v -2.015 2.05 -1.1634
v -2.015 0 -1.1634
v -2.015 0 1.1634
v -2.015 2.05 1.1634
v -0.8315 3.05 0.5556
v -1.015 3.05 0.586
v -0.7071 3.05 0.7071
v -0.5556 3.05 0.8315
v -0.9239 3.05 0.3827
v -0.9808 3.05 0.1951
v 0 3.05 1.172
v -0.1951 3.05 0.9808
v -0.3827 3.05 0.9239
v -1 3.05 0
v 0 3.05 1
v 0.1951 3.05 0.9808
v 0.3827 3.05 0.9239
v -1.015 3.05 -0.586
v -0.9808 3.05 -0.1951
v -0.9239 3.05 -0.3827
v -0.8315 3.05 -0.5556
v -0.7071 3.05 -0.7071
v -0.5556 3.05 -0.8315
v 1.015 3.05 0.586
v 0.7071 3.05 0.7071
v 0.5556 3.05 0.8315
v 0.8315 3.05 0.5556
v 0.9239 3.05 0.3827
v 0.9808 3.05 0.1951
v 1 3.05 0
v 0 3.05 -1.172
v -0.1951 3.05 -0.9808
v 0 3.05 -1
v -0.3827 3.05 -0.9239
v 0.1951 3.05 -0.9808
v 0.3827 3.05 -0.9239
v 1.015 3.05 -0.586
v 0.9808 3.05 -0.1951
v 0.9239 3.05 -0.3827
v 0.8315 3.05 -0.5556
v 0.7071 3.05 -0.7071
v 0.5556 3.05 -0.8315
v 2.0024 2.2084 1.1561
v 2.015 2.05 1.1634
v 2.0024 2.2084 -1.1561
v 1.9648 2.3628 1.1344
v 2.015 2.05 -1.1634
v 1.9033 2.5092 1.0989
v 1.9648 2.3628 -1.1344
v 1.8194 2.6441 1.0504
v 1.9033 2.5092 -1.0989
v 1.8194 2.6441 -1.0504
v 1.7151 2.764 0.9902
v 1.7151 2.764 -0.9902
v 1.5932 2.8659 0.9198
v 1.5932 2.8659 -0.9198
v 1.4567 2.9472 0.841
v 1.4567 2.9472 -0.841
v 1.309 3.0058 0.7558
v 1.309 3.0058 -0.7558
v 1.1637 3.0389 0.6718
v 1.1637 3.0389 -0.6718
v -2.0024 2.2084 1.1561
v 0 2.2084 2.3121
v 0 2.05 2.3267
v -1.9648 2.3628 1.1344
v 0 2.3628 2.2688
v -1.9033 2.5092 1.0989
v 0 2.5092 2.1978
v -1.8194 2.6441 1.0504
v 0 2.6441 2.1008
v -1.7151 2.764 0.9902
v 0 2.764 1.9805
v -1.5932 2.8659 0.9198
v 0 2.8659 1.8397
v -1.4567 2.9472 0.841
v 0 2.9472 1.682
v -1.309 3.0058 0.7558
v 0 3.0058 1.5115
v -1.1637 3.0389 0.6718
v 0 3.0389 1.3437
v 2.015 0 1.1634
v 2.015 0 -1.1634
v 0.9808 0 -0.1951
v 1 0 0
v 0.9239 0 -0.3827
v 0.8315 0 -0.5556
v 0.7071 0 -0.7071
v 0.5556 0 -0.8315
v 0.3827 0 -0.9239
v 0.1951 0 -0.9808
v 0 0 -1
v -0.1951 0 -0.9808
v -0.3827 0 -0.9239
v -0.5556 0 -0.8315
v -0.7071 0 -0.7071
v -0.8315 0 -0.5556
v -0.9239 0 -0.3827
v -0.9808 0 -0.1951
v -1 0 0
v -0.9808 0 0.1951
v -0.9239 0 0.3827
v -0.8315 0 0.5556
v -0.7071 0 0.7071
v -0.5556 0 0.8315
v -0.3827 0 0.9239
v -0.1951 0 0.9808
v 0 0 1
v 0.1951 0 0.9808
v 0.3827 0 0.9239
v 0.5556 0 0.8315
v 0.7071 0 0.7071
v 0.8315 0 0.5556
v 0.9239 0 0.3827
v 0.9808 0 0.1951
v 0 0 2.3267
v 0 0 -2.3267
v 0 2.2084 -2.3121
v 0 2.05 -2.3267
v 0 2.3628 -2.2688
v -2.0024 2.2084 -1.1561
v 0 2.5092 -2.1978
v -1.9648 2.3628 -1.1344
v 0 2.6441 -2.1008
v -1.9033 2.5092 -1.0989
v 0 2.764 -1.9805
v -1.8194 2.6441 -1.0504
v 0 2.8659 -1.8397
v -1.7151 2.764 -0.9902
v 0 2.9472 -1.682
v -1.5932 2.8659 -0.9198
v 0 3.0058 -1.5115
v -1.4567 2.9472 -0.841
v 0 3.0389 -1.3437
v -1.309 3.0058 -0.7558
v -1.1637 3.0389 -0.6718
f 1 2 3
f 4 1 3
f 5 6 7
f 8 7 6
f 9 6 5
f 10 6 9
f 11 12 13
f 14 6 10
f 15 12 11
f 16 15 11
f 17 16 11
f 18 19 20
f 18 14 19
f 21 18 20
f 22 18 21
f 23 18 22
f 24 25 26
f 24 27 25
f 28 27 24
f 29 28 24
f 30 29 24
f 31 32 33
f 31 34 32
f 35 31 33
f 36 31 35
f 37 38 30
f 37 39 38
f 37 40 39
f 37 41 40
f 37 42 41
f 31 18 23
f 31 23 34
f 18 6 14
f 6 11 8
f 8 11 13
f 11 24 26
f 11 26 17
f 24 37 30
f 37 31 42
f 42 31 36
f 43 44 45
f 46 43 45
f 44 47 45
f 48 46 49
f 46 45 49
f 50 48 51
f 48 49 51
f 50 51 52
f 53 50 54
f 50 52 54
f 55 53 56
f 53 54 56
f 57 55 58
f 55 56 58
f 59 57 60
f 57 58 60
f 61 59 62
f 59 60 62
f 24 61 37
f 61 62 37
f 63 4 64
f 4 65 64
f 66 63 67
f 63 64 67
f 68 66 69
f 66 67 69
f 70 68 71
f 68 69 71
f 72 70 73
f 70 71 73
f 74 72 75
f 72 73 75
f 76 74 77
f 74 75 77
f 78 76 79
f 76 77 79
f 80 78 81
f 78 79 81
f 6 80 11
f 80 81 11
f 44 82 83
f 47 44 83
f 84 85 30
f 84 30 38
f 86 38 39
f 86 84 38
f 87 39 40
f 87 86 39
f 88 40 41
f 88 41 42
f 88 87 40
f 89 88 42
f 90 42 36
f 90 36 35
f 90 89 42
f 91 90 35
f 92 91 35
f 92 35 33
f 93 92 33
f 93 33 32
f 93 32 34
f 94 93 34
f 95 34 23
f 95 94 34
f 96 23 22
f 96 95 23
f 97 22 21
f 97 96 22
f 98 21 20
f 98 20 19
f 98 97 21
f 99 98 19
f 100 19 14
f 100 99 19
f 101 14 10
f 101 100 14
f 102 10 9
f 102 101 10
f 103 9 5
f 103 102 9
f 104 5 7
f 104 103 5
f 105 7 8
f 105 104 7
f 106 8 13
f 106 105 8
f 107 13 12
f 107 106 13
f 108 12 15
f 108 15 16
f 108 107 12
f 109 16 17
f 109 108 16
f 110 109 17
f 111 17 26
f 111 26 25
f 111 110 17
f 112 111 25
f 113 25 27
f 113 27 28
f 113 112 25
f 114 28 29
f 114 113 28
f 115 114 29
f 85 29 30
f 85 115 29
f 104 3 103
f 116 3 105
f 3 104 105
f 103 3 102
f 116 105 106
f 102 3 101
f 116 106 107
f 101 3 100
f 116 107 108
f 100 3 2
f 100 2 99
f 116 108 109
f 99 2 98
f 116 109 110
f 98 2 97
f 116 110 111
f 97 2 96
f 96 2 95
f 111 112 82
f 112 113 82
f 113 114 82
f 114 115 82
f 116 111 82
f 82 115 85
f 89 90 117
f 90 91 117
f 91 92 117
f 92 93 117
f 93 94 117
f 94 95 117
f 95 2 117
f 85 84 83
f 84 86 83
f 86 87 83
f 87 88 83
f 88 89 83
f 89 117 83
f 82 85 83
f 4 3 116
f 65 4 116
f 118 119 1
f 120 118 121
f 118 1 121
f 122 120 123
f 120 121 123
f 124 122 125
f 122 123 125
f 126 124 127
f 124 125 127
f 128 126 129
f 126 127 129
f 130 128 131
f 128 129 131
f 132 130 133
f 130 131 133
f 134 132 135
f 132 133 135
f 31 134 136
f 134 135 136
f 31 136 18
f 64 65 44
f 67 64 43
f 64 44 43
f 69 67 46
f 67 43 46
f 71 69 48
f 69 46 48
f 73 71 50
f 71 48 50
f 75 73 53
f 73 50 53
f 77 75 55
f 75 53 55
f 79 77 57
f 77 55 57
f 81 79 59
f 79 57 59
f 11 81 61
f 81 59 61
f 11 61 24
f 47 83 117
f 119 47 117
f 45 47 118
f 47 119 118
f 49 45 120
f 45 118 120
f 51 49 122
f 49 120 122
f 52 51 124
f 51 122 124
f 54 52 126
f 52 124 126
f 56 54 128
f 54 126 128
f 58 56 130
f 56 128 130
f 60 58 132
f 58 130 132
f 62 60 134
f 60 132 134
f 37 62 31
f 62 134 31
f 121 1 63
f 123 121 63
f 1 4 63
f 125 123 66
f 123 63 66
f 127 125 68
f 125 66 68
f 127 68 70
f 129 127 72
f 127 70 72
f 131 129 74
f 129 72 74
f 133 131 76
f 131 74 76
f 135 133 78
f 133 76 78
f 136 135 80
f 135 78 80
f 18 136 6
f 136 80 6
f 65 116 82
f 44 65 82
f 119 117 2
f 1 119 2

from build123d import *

# Parameters (mm, degrees)
SKETCH1_R           = 1
BOSS_EXTRUDE1_DEPTH = 3.05
FILLET1_R           = 1


with BuildPart() as part:
    # Sketch1 → Boss-Extrude1 (new body)
    with BuildSketch(Plane(origin=(0, 0, 0), x_dir=(1, 0, 0), z_dir=(0, 1, 0))):
        Polygon((2.015, 1.163360792), (0, 2.326721585), (-2.015, 1.163360792), (-2.015, -1.163360792), (0, -2.326721585), (2.015, -1.163360792), align=None)
        Circle(SKETCH1_R, mode=Mode.SUBTRACT)
    extrude(amount=BOSS_EXTRUDE1_DEPTH)

    # Fillet1
    fillet1_edges = [part.edges().sort_by_distance(p)[0] for p in [
        (-1.0075, 3.05, -1.745041189),
        (-2.015, 3.05, 0),
        (-1.0075, 3.05, 1.745041189),
        (1.0075, 3.05, 1.745041189),
        (2.015, 3.05, 0),
        (1.0075, 3.05, -1.745041189),
    ]]
    fillet(fillet1_edges, radius=FILLET1_R)


solid = part.part
